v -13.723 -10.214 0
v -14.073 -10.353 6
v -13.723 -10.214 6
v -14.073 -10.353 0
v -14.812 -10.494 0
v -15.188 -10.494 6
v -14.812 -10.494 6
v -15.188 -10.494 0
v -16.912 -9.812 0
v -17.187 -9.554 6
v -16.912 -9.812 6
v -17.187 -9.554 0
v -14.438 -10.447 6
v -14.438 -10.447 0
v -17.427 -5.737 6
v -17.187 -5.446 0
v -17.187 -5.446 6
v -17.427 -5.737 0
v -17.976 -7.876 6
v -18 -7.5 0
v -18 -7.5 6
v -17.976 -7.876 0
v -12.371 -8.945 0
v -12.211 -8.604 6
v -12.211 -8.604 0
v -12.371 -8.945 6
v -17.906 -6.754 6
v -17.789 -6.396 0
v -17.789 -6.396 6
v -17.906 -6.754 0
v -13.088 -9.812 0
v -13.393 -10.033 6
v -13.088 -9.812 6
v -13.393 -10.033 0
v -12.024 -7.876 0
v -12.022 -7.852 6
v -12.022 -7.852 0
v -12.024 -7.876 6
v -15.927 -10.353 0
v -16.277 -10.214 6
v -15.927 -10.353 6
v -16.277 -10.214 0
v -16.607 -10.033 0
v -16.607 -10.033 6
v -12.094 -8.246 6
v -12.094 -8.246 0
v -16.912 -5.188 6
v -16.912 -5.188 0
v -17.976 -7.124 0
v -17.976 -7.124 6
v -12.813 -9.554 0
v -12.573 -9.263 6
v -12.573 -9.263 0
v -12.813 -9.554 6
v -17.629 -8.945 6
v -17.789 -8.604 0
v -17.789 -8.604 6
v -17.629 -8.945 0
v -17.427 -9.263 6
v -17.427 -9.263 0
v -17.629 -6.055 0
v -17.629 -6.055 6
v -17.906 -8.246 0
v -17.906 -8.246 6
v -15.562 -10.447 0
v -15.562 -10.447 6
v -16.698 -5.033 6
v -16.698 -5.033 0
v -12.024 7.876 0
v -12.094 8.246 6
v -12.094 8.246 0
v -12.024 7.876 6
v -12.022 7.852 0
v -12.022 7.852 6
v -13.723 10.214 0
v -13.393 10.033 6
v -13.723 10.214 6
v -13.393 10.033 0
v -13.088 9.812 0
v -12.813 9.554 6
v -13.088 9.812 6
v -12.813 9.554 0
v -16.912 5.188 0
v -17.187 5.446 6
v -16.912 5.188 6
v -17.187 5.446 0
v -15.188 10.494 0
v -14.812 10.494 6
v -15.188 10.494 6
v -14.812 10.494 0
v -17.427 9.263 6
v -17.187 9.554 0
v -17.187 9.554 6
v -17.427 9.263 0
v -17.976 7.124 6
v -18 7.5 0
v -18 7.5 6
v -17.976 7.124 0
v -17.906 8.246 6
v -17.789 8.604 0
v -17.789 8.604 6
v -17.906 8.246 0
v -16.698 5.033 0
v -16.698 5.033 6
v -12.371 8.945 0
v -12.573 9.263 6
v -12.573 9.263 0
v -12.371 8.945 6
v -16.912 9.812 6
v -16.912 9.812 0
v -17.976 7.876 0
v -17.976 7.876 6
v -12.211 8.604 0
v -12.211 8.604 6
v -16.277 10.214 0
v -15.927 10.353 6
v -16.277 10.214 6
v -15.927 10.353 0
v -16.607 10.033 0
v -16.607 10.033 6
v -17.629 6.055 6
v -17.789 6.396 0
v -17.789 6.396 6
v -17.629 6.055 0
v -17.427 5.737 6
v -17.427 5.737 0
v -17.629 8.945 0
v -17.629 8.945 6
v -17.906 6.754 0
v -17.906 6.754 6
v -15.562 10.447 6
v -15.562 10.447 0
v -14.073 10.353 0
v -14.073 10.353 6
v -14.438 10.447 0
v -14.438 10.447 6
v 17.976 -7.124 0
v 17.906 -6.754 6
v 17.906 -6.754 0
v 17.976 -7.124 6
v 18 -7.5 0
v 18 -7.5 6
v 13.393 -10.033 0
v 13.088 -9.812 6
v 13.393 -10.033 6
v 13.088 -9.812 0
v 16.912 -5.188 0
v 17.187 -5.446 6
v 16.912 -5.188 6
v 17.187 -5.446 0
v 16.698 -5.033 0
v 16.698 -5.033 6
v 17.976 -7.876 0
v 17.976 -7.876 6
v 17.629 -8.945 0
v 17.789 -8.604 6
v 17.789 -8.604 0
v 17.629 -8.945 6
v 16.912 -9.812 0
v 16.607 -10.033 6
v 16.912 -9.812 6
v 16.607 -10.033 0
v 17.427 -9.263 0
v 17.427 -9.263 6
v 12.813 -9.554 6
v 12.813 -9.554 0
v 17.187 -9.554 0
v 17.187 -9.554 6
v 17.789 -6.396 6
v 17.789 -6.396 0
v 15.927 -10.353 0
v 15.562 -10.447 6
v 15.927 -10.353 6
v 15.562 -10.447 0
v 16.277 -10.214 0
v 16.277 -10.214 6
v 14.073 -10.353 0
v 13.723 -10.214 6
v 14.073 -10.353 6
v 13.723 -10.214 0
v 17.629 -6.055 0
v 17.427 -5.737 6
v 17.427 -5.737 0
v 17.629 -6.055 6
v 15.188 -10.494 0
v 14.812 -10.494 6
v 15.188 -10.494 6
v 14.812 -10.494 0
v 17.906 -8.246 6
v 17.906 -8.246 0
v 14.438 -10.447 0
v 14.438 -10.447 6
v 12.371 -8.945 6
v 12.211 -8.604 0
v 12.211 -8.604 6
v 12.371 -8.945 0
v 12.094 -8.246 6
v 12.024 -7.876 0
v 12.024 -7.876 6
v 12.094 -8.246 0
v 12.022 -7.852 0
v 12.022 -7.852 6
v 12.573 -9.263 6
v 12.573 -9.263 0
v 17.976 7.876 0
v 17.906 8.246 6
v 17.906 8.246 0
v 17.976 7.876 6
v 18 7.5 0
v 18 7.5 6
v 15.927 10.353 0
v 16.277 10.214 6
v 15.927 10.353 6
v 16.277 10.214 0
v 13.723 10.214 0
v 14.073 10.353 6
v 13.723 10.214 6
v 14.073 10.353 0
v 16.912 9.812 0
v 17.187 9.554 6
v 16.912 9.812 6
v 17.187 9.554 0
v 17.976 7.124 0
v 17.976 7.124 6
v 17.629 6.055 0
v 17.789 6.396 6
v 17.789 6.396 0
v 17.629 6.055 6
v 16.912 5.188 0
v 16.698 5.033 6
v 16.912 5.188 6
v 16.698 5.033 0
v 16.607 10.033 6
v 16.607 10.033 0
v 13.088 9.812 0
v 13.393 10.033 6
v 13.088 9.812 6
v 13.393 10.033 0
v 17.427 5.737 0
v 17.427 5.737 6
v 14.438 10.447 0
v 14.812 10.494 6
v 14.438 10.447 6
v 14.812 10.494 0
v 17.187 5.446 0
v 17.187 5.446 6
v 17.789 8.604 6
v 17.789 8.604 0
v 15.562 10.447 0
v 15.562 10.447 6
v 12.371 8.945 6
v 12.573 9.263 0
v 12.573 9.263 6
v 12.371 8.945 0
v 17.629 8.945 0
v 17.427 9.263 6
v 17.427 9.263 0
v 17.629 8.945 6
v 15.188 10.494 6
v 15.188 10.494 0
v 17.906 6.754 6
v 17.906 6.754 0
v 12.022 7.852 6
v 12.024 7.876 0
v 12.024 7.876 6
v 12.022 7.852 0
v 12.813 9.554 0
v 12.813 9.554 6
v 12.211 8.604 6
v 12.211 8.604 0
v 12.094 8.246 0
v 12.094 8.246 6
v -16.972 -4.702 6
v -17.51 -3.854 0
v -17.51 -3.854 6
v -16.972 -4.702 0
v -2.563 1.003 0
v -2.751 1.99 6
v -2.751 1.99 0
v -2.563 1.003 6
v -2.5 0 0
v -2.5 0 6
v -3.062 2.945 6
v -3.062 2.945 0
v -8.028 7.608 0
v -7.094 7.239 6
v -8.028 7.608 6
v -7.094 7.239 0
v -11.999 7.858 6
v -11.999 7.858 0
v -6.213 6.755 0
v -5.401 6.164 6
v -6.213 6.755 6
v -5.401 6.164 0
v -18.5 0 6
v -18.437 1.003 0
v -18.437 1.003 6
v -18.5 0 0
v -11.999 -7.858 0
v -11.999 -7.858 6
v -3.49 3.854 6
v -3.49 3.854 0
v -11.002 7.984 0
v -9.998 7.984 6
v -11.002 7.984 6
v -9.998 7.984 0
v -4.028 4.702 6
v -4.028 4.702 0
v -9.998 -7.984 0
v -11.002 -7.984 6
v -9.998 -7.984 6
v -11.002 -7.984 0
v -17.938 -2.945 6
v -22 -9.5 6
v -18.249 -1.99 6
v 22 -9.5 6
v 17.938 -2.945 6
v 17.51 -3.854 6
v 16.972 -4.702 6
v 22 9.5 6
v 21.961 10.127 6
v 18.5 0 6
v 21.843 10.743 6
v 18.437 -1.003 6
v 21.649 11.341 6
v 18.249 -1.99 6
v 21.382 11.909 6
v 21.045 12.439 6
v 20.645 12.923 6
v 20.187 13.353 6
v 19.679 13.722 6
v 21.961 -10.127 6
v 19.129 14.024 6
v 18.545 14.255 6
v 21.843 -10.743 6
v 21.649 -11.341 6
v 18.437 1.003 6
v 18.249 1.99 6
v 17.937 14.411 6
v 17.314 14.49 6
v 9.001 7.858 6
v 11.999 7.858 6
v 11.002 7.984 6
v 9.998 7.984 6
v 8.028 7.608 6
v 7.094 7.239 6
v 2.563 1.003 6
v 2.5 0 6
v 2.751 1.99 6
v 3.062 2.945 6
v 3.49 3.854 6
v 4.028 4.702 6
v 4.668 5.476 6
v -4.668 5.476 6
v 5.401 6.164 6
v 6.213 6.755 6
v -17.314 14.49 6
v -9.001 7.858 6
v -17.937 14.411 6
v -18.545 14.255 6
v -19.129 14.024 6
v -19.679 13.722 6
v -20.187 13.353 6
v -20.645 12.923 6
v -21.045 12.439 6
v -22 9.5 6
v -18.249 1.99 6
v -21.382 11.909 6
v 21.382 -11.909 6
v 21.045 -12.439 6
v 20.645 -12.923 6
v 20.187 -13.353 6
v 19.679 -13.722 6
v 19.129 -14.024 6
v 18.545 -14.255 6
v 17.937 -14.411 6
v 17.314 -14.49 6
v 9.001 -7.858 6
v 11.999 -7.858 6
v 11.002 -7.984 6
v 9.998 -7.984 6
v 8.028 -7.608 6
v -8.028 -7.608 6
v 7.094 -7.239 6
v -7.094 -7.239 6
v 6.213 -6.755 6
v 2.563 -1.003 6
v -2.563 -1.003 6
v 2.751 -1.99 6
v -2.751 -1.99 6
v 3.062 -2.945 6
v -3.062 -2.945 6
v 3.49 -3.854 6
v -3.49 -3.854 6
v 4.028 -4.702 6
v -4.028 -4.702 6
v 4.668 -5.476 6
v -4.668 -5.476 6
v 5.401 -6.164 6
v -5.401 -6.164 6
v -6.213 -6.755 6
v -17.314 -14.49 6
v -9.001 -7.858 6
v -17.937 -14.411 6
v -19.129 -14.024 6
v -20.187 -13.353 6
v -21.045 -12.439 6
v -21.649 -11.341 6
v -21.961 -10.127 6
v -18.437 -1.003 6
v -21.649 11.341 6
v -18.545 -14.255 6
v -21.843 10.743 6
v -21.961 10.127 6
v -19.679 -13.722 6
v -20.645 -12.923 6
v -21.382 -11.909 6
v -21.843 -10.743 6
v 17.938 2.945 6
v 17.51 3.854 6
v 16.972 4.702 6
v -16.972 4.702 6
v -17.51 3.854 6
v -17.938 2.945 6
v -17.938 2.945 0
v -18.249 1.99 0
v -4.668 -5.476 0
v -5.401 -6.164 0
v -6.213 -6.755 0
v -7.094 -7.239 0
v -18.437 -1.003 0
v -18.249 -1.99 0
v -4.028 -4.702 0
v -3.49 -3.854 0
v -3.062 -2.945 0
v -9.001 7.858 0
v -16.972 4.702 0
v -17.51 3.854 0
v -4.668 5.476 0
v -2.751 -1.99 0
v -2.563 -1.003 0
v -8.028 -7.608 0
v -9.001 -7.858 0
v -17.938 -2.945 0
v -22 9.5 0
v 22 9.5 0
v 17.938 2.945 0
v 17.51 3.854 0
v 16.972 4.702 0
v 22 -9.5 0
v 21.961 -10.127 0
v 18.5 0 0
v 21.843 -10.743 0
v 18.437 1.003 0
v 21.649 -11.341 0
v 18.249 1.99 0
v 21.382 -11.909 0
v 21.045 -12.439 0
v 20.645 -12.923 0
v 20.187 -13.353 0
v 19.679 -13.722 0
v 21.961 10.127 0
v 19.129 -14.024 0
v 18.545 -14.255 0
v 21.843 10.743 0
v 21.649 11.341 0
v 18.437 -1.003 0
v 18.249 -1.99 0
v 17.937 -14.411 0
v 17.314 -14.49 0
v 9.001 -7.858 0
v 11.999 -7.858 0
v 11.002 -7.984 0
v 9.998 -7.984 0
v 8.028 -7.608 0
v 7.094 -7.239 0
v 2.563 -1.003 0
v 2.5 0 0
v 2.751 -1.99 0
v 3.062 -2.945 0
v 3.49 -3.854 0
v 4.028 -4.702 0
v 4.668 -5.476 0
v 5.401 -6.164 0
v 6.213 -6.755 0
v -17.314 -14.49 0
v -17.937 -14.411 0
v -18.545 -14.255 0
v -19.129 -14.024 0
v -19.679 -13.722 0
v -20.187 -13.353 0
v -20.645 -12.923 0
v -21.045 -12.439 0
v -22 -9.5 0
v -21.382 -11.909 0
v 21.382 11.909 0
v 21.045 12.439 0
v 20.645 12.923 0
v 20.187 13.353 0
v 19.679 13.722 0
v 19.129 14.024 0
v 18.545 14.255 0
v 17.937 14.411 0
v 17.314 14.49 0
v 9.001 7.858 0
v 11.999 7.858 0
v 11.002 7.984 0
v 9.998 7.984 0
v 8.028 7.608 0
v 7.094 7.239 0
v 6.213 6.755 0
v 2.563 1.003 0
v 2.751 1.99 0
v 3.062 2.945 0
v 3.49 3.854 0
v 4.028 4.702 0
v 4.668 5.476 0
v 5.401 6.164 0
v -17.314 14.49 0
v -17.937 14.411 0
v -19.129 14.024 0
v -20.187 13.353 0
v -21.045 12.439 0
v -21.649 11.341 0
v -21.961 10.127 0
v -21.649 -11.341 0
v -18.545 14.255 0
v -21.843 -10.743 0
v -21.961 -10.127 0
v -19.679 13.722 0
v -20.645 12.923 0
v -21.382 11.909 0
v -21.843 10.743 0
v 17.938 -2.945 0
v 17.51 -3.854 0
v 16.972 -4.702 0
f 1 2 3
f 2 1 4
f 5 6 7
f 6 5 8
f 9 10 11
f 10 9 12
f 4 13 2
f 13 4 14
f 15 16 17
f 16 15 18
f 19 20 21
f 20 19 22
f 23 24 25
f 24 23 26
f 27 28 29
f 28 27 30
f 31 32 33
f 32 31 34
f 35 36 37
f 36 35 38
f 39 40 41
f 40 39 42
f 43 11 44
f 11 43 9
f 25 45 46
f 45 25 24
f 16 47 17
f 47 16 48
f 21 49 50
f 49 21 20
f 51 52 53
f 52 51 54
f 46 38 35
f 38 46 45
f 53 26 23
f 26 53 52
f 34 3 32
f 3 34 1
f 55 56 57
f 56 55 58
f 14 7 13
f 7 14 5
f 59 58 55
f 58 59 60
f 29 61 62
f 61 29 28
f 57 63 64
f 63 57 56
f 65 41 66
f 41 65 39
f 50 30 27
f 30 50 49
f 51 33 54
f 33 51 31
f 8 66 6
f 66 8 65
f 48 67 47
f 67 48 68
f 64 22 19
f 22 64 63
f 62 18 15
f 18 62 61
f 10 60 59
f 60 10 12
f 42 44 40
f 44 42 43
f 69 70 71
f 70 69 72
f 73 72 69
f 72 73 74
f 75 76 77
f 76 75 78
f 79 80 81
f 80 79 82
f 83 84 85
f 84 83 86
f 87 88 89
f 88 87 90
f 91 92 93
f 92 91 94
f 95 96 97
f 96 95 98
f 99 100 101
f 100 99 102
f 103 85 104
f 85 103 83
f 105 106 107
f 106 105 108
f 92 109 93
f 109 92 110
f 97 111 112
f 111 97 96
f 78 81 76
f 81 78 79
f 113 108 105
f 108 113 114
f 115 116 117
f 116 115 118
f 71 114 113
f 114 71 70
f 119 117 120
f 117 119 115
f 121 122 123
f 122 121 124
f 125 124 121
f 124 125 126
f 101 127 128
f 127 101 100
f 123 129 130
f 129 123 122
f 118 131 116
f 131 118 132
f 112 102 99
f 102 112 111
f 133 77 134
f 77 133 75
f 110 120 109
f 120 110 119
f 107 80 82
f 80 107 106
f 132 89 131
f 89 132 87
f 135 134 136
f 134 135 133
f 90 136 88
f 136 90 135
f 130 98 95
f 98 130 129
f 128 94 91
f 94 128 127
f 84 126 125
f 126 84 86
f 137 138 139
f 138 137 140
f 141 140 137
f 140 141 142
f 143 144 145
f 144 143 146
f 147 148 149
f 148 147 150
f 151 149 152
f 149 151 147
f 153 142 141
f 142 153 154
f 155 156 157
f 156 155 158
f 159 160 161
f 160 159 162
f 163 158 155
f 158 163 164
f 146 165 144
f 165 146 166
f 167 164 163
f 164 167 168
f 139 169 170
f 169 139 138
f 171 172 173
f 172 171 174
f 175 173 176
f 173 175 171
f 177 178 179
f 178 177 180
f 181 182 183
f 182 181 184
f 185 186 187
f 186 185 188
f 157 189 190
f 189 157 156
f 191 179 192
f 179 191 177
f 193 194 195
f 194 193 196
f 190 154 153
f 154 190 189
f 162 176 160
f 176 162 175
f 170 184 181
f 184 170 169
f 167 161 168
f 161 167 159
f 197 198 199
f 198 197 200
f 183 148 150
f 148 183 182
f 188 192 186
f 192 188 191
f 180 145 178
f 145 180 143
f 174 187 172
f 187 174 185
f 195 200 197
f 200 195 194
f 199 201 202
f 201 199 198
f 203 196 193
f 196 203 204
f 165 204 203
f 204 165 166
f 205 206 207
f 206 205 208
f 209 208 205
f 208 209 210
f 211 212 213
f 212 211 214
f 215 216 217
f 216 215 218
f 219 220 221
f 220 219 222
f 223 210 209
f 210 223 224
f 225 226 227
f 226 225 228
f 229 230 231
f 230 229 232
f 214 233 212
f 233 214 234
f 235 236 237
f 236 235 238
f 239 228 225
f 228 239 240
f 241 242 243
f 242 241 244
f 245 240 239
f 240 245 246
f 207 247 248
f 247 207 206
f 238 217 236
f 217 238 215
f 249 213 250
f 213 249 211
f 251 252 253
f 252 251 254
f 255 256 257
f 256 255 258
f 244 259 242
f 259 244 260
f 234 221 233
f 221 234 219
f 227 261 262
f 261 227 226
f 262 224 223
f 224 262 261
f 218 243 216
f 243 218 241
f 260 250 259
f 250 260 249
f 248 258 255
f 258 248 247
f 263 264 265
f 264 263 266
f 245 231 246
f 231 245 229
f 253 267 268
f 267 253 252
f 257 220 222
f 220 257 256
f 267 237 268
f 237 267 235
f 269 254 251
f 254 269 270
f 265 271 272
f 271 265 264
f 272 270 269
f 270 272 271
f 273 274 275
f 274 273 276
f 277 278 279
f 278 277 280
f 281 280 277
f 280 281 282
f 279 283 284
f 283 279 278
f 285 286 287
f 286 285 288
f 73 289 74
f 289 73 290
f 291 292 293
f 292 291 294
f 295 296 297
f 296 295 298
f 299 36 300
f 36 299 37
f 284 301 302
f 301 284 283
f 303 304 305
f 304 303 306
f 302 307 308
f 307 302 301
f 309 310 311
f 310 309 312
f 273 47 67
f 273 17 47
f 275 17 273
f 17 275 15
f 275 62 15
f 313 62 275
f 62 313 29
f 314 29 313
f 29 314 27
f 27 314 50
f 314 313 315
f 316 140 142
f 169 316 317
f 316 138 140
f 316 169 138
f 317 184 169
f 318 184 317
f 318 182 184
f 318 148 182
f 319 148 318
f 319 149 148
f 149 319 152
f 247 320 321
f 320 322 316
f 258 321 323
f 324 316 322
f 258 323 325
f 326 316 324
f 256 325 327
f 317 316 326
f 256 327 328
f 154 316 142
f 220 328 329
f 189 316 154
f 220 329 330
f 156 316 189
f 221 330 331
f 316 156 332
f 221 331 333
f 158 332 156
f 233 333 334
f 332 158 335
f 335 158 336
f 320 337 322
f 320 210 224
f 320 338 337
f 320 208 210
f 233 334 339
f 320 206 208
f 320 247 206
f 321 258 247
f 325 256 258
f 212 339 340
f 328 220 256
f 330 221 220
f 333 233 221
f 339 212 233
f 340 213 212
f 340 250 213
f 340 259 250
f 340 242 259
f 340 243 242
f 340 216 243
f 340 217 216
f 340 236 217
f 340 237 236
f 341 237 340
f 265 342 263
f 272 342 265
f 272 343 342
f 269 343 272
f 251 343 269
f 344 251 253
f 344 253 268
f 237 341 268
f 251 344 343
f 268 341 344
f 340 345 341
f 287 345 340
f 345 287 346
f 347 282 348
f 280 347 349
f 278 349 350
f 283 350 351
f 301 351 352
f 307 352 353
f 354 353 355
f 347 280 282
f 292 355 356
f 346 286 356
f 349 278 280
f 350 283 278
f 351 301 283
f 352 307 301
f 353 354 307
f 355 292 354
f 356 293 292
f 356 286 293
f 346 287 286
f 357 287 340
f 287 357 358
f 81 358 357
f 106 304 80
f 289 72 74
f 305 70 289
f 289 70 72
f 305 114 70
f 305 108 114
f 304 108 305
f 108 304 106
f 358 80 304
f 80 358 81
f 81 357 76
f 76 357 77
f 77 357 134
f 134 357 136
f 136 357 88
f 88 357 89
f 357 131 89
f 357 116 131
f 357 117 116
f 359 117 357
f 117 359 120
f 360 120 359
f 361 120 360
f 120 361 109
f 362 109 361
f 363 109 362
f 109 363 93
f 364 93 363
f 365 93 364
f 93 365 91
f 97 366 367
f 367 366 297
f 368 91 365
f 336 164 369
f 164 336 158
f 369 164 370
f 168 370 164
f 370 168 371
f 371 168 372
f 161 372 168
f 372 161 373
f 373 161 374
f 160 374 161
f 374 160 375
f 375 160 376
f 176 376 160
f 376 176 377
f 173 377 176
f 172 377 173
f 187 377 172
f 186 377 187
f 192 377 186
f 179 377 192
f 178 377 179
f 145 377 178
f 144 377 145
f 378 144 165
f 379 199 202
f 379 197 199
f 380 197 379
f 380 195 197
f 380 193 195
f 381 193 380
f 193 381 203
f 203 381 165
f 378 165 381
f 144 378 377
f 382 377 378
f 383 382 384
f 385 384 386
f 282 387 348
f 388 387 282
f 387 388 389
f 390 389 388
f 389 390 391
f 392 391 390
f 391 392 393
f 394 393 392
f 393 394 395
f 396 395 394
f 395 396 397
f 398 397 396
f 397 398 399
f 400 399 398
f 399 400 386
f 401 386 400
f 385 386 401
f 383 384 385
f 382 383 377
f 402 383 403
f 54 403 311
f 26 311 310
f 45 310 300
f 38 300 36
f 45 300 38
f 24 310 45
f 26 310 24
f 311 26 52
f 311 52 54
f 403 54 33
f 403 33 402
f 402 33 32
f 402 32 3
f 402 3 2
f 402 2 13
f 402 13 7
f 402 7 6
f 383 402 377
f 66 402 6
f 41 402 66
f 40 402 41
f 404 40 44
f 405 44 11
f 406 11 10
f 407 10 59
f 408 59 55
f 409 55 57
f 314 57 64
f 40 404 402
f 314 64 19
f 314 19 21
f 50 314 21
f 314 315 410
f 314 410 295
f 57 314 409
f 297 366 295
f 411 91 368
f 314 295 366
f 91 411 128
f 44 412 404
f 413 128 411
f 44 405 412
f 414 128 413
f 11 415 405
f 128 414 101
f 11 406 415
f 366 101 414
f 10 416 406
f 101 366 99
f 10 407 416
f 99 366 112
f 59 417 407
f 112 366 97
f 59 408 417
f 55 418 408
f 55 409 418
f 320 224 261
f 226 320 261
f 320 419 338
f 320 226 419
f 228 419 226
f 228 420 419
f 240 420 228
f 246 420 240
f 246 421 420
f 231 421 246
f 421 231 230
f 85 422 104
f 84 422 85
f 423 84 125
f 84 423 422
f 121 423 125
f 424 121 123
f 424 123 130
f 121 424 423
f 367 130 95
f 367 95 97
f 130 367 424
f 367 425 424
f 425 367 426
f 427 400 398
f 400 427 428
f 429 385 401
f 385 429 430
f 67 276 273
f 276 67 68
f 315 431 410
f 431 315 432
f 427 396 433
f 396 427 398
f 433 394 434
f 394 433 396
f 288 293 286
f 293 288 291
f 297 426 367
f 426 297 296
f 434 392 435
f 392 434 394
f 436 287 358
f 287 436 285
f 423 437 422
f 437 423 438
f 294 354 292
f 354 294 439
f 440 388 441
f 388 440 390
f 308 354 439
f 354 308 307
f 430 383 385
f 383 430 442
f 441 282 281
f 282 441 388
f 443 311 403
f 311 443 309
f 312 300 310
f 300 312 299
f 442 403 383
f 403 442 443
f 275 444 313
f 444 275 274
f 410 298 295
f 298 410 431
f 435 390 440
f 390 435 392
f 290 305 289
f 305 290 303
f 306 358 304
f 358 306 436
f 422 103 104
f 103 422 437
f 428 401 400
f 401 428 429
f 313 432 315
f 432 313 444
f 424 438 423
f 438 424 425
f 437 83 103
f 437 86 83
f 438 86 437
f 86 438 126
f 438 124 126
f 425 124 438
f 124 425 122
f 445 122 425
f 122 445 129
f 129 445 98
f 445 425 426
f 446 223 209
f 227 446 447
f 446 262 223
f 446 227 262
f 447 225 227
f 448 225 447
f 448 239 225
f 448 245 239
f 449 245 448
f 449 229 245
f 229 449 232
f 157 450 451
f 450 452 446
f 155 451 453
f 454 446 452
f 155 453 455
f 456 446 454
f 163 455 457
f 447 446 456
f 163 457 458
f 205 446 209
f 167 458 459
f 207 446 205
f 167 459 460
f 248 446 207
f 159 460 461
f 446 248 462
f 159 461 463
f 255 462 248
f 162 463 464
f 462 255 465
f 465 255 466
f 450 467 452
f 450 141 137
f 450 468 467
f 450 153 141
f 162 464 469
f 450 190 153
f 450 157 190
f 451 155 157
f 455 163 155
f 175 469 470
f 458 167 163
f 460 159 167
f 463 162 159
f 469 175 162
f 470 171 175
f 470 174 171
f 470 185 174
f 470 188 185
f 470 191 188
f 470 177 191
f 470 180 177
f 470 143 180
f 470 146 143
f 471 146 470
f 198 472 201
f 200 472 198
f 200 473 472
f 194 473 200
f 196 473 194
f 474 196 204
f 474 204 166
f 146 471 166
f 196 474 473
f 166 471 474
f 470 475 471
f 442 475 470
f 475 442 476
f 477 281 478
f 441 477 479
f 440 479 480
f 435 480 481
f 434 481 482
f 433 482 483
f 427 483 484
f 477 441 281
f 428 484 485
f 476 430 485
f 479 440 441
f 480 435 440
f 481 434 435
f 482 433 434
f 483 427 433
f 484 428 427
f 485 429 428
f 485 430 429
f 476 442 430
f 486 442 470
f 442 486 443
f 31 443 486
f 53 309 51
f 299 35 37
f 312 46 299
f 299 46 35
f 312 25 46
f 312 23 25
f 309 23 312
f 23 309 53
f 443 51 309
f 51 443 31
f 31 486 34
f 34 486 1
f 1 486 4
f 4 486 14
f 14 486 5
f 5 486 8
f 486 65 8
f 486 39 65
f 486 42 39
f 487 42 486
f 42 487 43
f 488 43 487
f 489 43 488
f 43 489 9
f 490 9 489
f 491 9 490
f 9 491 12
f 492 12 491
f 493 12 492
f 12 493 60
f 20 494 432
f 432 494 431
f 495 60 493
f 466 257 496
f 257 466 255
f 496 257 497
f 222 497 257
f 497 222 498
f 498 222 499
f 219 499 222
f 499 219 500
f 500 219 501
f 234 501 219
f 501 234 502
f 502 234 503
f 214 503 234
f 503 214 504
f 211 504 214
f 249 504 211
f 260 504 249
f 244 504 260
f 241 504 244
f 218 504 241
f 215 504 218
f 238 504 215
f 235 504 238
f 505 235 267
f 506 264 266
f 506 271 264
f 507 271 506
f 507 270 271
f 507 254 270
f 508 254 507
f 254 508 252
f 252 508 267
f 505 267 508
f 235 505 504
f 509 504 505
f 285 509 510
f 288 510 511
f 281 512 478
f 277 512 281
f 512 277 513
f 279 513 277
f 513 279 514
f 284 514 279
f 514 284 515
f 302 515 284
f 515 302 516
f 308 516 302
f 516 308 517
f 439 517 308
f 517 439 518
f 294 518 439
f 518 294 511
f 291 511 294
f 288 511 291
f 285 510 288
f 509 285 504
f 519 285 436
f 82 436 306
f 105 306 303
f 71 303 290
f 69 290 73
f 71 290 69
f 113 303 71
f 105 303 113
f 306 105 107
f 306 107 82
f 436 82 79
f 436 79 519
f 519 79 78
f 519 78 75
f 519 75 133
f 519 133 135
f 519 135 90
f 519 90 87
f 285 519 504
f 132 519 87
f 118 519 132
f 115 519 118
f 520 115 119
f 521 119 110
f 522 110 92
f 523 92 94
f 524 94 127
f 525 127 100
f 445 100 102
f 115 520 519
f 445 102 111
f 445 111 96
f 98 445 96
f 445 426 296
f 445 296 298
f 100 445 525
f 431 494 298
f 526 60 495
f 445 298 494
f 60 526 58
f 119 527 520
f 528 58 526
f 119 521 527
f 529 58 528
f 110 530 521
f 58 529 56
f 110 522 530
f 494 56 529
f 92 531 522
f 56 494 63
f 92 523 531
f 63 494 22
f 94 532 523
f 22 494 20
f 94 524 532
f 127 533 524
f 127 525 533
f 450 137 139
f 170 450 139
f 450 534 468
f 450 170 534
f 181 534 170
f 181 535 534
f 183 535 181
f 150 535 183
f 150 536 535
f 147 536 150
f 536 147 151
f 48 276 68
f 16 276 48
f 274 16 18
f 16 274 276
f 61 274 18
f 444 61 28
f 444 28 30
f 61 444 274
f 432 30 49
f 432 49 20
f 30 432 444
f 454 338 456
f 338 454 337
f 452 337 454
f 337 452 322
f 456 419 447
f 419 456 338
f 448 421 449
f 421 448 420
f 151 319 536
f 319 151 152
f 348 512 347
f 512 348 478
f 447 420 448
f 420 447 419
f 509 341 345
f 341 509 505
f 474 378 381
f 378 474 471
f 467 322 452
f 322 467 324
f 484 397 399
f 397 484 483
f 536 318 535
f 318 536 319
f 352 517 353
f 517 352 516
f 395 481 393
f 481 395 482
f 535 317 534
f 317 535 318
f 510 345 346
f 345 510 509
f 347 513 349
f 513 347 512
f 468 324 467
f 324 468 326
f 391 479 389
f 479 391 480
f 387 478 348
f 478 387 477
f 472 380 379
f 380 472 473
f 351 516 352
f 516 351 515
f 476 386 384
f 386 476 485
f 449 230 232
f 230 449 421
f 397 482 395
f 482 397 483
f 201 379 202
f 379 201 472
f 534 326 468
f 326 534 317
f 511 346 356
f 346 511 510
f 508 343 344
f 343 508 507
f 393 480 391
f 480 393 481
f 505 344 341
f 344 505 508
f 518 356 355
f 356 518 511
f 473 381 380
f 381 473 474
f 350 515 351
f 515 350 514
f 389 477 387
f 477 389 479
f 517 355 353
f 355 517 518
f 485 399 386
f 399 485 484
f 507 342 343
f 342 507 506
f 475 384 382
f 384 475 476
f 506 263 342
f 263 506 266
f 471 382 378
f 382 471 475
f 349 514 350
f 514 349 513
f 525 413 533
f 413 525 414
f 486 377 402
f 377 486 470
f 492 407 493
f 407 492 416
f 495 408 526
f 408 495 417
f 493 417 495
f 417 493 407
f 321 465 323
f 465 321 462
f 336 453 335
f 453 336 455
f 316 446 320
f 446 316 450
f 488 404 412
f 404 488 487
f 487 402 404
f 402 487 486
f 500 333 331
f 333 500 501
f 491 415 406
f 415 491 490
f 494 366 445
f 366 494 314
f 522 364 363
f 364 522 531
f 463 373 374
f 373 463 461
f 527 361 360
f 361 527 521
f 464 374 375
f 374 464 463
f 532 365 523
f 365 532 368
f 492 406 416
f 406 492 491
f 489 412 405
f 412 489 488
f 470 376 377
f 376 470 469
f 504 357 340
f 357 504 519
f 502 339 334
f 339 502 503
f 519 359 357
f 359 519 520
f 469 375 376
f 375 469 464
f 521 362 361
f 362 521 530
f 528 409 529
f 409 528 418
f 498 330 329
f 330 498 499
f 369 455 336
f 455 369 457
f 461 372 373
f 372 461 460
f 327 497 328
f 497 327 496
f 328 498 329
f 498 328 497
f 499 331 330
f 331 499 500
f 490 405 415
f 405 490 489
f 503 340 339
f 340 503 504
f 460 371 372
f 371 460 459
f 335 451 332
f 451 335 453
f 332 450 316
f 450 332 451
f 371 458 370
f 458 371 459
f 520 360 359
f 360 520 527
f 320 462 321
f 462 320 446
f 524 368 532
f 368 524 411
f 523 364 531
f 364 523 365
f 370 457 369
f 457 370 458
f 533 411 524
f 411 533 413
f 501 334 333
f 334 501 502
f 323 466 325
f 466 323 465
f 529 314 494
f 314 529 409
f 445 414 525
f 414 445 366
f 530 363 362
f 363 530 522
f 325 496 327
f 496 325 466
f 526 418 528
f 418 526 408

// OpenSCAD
$fn = 50;


difference() {
	union() {
		hull() {
			translate(v = [-17.0000000000, 9.5000000000, 0]) {
				cylinder(h = 6, r = 5);
			}
			translate(v = [17.0000000000, 9.5000000000, 0]) {
				cylinder(h = 6, r = 5);
			}
			translate(v = [-17.0000000000, -9.5000000000, 0]) {
				cylinder(h = 6, r = 5);
			}
			translate(v = [17.0000000000, -9.5000000000, 0]) {
				cylinder(h = 6, r = 5);
			}
		}
	}
	union() {
		#translate(v = [-15.0000000000, -7.5000000000, -100.0000000000]) {
			cylinder(h = 200, r = 3.0000000000);
		}
		#translate(v = [-15.0000000000, 7.5000000000, -100.0000000000]) {
			cylinder(h = 200, r = 3.0000000000);
		}
		#translate(v = [15.0000000000, -7.5000000000, -100.0000000000]) {
			cylinder(h = 200, r = 3.0000000000);
		}
		#translate(v = [15.0000000000, 7.5000000000, -100.0000000000]) {
			cylinder(h = 200, r = 3.0000000000);
		}
		#translate(v = [-10.5000000000, 0, 0]) {
			cylinder(h = 6, r = 8.0000000000);
		}
		#translate(v = [10.5000000000, 0, 0]) {
			cylinder(h = 6, r = 8.0000000000);
		}
	}
}
